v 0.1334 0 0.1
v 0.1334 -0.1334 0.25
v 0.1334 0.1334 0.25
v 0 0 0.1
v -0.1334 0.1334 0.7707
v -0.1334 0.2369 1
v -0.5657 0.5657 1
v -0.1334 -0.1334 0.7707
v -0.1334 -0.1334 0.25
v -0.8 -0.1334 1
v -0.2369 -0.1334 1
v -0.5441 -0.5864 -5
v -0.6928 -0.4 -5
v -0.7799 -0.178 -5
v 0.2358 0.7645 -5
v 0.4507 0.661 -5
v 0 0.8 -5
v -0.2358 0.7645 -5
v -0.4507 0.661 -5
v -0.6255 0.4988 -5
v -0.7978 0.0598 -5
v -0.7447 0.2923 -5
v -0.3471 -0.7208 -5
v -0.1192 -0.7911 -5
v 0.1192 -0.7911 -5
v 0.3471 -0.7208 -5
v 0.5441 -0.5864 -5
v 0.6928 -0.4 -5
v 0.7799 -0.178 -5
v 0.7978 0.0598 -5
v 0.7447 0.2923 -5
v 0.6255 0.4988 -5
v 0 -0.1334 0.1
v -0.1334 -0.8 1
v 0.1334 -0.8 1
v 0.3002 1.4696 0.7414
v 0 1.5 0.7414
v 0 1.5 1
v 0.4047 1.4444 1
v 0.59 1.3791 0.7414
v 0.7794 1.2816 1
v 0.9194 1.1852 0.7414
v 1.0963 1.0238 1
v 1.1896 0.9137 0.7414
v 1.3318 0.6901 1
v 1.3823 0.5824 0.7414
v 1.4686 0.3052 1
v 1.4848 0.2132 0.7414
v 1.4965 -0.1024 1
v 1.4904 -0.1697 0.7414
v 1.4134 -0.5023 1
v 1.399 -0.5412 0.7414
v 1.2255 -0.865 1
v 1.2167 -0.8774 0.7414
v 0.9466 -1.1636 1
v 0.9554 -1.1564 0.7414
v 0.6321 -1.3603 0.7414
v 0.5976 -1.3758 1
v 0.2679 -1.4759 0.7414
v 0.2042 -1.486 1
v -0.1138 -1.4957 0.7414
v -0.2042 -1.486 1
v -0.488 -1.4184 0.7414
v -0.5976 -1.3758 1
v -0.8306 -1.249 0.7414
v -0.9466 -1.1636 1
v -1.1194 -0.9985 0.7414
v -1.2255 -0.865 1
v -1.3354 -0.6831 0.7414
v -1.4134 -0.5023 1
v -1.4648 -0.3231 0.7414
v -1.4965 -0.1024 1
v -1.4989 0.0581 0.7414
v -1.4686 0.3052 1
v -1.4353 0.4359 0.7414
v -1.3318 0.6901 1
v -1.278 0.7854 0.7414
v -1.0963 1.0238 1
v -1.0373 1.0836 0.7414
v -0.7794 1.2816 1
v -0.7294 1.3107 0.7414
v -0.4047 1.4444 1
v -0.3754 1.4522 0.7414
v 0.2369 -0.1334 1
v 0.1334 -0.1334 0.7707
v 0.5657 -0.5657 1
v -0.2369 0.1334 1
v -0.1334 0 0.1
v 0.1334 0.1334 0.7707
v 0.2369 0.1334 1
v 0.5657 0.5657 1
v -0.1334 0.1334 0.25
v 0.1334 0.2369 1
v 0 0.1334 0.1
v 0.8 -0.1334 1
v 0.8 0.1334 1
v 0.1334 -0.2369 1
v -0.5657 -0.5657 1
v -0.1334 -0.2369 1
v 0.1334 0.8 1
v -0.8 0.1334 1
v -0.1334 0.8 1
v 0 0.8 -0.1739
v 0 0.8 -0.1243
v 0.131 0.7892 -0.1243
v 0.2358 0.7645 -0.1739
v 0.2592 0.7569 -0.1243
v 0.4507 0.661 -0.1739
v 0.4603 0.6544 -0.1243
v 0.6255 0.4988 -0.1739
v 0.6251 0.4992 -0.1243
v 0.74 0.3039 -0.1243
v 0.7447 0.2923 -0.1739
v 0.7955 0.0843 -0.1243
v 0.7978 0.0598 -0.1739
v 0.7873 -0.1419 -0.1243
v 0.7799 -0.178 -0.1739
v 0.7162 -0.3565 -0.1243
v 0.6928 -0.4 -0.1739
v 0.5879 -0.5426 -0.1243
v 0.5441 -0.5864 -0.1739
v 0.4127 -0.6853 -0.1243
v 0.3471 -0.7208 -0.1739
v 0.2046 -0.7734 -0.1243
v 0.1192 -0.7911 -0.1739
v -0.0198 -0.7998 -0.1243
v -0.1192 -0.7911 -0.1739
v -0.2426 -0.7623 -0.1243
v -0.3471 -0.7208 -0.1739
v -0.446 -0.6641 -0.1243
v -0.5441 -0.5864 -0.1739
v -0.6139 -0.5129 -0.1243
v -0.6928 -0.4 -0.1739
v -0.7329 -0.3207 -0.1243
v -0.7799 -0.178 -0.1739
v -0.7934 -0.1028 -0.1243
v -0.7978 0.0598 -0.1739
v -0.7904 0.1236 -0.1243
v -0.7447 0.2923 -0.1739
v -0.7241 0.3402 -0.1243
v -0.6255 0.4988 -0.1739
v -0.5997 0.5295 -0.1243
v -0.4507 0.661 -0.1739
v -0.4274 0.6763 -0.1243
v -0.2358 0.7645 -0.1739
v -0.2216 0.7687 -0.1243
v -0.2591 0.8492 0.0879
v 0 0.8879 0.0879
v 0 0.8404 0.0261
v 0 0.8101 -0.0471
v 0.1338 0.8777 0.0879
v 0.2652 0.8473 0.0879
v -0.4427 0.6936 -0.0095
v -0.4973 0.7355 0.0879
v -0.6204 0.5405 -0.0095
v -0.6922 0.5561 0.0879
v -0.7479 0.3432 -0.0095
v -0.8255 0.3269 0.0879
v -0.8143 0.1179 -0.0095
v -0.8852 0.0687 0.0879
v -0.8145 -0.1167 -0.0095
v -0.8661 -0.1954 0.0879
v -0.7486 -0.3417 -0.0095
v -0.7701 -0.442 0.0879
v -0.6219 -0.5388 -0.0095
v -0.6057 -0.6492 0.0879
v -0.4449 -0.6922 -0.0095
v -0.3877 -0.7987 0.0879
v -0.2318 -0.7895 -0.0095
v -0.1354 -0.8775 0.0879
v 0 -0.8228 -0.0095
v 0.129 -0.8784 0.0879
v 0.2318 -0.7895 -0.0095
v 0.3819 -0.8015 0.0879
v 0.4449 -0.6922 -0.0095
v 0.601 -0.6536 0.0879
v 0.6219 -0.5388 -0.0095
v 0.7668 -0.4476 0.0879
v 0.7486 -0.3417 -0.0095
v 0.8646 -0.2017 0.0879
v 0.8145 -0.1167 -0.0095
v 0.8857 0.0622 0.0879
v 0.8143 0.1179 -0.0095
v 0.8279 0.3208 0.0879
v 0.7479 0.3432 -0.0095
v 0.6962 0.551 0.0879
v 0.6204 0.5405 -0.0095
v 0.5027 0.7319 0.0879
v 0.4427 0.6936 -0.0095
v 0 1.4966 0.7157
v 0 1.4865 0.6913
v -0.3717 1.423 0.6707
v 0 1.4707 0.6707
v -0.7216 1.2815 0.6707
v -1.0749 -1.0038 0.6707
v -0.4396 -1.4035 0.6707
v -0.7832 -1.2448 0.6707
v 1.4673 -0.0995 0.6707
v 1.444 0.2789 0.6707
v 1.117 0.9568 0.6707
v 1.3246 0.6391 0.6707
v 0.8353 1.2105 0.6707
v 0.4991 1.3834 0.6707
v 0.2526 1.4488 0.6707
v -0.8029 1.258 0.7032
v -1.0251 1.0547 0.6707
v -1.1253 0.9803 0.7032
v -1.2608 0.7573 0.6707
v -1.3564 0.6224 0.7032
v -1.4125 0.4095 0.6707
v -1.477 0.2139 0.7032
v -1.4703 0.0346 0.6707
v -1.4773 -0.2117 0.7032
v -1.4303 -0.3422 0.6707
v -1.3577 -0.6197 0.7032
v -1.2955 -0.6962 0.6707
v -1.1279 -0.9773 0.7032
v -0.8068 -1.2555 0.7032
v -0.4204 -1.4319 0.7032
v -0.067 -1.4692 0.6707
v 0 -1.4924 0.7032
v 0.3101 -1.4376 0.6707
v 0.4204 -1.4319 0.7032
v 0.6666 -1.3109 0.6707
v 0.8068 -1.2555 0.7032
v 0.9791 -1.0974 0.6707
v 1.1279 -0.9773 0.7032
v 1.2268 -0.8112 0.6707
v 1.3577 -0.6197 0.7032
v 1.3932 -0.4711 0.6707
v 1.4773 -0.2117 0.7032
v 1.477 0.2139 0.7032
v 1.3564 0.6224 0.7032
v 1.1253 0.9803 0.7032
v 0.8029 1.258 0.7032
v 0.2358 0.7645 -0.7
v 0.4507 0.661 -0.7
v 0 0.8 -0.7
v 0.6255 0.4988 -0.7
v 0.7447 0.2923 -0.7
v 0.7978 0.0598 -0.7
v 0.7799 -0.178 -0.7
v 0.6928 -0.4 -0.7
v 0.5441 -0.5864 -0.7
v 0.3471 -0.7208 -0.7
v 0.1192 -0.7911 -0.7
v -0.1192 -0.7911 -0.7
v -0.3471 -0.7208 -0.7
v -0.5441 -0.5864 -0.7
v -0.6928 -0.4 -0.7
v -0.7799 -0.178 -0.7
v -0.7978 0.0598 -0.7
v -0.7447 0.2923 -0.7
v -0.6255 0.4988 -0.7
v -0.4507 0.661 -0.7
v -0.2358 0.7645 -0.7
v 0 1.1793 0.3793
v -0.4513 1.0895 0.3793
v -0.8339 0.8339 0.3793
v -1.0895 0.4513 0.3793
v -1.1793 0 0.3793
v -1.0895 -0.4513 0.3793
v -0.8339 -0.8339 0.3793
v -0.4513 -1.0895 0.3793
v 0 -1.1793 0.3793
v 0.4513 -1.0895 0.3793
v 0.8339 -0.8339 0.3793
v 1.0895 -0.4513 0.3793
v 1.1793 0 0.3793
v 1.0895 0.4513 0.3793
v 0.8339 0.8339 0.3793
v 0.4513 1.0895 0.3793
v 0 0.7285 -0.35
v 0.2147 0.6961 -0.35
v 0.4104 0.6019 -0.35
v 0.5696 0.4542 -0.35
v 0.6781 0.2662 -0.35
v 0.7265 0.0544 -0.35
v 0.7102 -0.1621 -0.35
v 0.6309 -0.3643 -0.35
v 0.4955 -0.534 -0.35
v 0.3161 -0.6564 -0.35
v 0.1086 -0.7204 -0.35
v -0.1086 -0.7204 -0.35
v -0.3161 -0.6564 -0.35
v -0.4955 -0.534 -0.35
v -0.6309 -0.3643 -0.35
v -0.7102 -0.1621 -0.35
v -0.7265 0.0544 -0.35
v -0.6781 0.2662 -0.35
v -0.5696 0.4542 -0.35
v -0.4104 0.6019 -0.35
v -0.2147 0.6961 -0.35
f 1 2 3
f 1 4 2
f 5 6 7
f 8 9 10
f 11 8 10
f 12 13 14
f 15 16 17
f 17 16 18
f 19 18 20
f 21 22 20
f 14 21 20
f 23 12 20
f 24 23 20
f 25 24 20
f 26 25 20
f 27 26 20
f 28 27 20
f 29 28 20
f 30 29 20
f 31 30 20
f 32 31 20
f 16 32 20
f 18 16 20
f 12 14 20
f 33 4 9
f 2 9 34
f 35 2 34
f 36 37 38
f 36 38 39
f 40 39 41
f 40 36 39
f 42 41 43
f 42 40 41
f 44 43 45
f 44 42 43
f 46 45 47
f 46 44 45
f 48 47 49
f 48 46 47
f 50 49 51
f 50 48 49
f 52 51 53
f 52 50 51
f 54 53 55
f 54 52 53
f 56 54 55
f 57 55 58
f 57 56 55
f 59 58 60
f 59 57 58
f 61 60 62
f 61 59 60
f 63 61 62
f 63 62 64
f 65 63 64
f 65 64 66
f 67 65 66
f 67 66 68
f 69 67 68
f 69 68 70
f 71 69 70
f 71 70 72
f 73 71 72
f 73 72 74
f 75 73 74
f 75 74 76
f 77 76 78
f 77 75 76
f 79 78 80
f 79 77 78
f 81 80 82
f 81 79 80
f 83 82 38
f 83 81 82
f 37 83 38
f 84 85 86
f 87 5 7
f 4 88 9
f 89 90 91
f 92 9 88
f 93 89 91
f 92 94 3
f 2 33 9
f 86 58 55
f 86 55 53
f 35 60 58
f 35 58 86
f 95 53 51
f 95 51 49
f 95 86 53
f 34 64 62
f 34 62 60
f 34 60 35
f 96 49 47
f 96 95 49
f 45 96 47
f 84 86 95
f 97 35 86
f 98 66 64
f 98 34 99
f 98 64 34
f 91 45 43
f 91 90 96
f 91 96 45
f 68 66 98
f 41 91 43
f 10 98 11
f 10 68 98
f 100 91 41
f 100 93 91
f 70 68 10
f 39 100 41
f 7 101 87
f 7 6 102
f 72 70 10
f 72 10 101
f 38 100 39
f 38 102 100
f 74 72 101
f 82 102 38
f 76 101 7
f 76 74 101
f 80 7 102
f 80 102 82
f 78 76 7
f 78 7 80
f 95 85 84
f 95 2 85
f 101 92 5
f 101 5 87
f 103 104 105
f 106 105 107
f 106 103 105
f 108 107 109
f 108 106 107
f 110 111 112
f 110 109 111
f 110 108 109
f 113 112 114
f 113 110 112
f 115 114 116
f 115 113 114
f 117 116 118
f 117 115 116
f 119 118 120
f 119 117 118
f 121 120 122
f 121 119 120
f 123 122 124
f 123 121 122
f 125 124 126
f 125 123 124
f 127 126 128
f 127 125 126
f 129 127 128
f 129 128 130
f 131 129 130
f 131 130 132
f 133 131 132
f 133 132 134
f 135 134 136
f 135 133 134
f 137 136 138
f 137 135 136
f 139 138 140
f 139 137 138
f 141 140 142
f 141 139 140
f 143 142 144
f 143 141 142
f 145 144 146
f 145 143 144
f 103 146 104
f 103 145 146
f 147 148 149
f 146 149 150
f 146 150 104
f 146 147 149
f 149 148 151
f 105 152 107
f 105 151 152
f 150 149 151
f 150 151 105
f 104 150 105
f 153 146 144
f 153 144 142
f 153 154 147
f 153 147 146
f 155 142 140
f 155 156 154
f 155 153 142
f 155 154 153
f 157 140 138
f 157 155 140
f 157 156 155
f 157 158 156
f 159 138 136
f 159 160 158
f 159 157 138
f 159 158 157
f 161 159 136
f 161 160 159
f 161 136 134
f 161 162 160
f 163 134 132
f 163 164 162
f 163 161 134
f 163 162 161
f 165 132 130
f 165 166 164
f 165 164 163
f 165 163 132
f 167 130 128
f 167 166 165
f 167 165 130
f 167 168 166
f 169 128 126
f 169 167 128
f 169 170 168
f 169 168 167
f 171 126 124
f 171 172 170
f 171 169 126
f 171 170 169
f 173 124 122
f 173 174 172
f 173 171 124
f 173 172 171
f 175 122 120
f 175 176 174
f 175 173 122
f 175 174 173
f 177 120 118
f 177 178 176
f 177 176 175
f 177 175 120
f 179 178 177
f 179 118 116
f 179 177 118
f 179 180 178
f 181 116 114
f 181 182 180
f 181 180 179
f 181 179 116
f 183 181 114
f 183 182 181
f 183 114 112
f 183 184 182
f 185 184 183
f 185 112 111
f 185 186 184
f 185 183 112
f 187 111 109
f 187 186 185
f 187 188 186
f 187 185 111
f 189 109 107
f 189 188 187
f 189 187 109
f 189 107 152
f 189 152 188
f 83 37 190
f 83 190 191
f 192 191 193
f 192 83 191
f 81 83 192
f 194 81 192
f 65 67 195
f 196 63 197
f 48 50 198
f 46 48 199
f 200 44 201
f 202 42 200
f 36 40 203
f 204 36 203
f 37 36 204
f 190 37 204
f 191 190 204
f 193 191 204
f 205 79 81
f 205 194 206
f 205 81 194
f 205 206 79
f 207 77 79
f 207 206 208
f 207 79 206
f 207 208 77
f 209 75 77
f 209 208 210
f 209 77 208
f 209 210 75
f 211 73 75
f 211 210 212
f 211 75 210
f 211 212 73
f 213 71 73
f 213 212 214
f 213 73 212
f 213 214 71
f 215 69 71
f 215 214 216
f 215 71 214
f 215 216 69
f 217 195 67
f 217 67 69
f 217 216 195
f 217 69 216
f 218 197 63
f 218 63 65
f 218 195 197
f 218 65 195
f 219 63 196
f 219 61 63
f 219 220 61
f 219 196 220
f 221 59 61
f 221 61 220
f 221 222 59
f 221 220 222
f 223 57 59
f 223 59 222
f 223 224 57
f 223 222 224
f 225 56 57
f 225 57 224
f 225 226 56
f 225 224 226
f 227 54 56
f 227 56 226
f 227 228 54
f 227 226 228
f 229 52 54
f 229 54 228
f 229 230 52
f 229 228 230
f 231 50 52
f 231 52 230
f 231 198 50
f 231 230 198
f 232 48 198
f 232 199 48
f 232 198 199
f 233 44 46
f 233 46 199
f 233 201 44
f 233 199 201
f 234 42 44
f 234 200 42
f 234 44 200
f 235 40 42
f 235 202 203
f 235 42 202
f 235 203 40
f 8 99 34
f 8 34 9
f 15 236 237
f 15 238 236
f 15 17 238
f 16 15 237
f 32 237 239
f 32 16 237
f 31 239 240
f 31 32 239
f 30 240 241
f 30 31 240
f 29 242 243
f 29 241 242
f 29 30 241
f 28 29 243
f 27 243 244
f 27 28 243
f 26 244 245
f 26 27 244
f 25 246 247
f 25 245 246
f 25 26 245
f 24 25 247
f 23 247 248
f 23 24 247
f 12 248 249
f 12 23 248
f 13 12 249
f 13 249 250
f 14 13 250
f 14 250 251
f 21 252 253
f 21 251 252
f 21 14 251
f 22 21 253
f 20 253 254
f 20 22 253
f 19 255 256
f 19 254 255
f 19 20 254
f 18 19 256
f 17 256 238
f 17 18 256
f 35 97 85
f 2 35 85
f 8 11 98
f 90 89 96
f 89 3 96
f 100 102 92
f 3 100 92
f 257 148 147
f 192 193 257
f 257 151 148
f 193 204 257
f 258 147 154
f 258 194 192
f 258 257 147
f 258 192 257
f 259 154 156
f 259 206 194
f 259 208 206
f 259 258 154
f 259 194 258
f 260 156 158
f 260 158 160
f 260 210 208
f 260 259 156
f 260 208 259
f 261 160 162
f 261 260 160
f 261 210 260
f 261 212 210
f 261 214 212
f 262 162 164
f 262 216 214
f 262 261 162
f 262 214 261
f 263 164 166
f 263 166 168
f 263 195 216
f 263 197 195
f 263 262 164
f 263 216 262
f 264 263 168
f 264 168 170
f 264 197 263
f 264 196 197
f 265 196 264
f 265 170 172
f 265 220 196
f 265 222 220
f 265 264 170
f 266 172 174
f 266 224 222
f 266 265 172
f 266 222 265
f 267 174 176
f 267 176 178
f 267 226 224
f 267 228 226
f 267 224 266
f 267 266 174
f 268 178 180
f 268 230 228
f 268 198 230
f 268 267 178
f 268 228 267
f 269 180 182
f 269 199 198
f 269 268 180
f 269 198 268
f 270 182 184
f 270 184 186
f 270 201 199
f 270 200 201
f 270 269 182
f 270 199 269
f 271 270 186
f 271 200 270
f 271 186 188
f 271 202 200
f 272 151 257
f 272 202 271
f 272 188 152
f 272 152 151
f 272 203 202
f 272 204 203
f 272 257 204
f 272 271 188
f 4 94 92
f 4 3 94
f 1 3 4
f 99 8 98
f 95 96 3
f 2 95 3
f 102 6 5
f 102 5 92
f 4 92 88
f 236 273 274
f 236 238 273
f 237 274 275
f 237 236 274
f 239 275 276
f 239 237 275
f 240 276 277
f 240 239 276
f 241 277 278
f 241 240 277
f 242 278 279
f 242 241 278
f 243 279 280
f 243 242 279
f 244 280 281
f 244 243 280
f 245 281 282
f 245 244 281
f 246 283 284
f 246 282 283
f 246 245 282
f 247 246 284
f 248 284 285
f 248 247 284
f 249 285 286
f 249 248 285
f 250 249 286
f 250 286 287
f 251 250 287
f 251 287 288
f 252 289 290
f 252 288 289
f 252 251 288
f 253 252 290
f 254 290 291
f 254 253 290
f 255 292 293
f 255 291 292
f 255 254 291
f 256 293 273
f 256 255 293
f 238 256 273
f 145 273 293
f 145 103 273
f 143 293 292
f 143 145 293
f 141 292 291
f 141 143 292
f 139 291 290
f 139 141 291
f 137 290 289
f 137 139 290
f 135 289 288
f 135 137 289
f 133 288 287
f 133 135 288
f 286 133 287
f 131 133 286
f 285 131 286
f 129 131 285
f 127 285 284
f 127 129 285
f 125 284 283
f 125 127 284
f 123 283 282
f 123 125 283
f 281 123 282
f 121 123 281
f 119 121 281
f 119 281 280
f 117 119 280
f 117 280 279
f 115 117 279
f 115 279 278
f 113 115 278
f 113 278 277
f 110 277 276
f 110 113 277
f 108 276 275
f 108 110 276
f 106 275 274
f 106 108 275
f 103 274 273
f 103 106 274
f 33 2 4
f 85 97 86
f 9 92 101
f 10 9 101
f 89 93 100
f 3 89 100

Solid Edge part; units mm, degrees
sketch "Sketch1" plane through (0, 0, 0) normal (1, 0, 0) x (0, 1, 0)
  line L0 (0, 1) -> (1.5, 1)
  line L1 (1.5, 1) -> (1.5, 0.7)
  line L2 (1.5, 0.7) -> (0.8, 0)
  line L3 (0.8, 0) -> (0.8, -0.1739)
  line L4 (0.8, -0.1739) -> (0.7285, -0.35)
  line L5 (0.7285, -0.35) -> (0.8, -0.7)
  line L6 (0.8, -0.7) -> (0.8, -5)
  line L7 (0.8, -5) -> (0, -5)
  dimension "D1" = 6
  dimension "D2" = 1
  dimension "D3" = 1.5
  dimension "D4" = 0.8
  dimension "D5" = 0.35
  dimension "D6" = 0.7
  dimension "D7" = 0.1739
revolve "RevolvedProtrusion1" add sketch "Sketch1" angle 360 about axis through (0, 0, -1.8) along (0, 0, 1)
fillet "Round1" radius 0.1 1 edges at (-1.5, 0, 0.7)
fillet "Round2" radius 0.3 1 edges at (-0.8, 0, 0)
cosmetic_thread "Thread1" size "M1.6"
sketch "Sketch2" plane through (0, 0, 0) normal (0, -1, 0) x (1, 0, 0)
  line L0 (-0.8, 1) -> (0.8, 1)
  line L1 (0.8, 1) -> (0, 0.1)
  line L2 (0, 0.1) -> (-0.8, 1)
extrude "Cutout1" cut sketch "Sketch2" along normal mid plane 0.2667
sketch "Sketch3" plane through (0, 0, 0) normal (1, 0, 0) x (0, 1, 0)
  line L0 (-0.8, 1) -> (0.8, 1)
  line L1 (0.8, 1) -> (0, 0.1)
  line L2 (0, 0.1) -> (-0.8, 1)
extrude "Cutout2" cut sketch "Sketch3" along normal mid plane 0.2667
sketch "Sketch4" plane through (0, 0, 0) normal (-0.7071068, -0.7071068, 0) x (0, 0, -1)
  line L0 (-0.7, 0) -> (-1, -0.8)
sketch "Sketch5" plane through (-0.5657, 0.5657, 1) normal (-0.6620847, 0.6620847, 0.3511234) x (-0.2482818, 0.2482818, -0.9363292)
  line L0 (0, 0) -> (-0.5163, 0.2)
  line L1 (-0.5163, 0.2) -> (-0.5163, -0.2)
  line L2 (-0.5163, -0.2) -> (0, 0)
sweep "SweptCutout1" cut profiles "Sketch5" path "Sketch4"
pattern_circular "Pattern1" count 4 over 360 about axis through (0, 0, 0) along (0, 0, -1) of "SweptCutout1"
properties material "Stahl"
